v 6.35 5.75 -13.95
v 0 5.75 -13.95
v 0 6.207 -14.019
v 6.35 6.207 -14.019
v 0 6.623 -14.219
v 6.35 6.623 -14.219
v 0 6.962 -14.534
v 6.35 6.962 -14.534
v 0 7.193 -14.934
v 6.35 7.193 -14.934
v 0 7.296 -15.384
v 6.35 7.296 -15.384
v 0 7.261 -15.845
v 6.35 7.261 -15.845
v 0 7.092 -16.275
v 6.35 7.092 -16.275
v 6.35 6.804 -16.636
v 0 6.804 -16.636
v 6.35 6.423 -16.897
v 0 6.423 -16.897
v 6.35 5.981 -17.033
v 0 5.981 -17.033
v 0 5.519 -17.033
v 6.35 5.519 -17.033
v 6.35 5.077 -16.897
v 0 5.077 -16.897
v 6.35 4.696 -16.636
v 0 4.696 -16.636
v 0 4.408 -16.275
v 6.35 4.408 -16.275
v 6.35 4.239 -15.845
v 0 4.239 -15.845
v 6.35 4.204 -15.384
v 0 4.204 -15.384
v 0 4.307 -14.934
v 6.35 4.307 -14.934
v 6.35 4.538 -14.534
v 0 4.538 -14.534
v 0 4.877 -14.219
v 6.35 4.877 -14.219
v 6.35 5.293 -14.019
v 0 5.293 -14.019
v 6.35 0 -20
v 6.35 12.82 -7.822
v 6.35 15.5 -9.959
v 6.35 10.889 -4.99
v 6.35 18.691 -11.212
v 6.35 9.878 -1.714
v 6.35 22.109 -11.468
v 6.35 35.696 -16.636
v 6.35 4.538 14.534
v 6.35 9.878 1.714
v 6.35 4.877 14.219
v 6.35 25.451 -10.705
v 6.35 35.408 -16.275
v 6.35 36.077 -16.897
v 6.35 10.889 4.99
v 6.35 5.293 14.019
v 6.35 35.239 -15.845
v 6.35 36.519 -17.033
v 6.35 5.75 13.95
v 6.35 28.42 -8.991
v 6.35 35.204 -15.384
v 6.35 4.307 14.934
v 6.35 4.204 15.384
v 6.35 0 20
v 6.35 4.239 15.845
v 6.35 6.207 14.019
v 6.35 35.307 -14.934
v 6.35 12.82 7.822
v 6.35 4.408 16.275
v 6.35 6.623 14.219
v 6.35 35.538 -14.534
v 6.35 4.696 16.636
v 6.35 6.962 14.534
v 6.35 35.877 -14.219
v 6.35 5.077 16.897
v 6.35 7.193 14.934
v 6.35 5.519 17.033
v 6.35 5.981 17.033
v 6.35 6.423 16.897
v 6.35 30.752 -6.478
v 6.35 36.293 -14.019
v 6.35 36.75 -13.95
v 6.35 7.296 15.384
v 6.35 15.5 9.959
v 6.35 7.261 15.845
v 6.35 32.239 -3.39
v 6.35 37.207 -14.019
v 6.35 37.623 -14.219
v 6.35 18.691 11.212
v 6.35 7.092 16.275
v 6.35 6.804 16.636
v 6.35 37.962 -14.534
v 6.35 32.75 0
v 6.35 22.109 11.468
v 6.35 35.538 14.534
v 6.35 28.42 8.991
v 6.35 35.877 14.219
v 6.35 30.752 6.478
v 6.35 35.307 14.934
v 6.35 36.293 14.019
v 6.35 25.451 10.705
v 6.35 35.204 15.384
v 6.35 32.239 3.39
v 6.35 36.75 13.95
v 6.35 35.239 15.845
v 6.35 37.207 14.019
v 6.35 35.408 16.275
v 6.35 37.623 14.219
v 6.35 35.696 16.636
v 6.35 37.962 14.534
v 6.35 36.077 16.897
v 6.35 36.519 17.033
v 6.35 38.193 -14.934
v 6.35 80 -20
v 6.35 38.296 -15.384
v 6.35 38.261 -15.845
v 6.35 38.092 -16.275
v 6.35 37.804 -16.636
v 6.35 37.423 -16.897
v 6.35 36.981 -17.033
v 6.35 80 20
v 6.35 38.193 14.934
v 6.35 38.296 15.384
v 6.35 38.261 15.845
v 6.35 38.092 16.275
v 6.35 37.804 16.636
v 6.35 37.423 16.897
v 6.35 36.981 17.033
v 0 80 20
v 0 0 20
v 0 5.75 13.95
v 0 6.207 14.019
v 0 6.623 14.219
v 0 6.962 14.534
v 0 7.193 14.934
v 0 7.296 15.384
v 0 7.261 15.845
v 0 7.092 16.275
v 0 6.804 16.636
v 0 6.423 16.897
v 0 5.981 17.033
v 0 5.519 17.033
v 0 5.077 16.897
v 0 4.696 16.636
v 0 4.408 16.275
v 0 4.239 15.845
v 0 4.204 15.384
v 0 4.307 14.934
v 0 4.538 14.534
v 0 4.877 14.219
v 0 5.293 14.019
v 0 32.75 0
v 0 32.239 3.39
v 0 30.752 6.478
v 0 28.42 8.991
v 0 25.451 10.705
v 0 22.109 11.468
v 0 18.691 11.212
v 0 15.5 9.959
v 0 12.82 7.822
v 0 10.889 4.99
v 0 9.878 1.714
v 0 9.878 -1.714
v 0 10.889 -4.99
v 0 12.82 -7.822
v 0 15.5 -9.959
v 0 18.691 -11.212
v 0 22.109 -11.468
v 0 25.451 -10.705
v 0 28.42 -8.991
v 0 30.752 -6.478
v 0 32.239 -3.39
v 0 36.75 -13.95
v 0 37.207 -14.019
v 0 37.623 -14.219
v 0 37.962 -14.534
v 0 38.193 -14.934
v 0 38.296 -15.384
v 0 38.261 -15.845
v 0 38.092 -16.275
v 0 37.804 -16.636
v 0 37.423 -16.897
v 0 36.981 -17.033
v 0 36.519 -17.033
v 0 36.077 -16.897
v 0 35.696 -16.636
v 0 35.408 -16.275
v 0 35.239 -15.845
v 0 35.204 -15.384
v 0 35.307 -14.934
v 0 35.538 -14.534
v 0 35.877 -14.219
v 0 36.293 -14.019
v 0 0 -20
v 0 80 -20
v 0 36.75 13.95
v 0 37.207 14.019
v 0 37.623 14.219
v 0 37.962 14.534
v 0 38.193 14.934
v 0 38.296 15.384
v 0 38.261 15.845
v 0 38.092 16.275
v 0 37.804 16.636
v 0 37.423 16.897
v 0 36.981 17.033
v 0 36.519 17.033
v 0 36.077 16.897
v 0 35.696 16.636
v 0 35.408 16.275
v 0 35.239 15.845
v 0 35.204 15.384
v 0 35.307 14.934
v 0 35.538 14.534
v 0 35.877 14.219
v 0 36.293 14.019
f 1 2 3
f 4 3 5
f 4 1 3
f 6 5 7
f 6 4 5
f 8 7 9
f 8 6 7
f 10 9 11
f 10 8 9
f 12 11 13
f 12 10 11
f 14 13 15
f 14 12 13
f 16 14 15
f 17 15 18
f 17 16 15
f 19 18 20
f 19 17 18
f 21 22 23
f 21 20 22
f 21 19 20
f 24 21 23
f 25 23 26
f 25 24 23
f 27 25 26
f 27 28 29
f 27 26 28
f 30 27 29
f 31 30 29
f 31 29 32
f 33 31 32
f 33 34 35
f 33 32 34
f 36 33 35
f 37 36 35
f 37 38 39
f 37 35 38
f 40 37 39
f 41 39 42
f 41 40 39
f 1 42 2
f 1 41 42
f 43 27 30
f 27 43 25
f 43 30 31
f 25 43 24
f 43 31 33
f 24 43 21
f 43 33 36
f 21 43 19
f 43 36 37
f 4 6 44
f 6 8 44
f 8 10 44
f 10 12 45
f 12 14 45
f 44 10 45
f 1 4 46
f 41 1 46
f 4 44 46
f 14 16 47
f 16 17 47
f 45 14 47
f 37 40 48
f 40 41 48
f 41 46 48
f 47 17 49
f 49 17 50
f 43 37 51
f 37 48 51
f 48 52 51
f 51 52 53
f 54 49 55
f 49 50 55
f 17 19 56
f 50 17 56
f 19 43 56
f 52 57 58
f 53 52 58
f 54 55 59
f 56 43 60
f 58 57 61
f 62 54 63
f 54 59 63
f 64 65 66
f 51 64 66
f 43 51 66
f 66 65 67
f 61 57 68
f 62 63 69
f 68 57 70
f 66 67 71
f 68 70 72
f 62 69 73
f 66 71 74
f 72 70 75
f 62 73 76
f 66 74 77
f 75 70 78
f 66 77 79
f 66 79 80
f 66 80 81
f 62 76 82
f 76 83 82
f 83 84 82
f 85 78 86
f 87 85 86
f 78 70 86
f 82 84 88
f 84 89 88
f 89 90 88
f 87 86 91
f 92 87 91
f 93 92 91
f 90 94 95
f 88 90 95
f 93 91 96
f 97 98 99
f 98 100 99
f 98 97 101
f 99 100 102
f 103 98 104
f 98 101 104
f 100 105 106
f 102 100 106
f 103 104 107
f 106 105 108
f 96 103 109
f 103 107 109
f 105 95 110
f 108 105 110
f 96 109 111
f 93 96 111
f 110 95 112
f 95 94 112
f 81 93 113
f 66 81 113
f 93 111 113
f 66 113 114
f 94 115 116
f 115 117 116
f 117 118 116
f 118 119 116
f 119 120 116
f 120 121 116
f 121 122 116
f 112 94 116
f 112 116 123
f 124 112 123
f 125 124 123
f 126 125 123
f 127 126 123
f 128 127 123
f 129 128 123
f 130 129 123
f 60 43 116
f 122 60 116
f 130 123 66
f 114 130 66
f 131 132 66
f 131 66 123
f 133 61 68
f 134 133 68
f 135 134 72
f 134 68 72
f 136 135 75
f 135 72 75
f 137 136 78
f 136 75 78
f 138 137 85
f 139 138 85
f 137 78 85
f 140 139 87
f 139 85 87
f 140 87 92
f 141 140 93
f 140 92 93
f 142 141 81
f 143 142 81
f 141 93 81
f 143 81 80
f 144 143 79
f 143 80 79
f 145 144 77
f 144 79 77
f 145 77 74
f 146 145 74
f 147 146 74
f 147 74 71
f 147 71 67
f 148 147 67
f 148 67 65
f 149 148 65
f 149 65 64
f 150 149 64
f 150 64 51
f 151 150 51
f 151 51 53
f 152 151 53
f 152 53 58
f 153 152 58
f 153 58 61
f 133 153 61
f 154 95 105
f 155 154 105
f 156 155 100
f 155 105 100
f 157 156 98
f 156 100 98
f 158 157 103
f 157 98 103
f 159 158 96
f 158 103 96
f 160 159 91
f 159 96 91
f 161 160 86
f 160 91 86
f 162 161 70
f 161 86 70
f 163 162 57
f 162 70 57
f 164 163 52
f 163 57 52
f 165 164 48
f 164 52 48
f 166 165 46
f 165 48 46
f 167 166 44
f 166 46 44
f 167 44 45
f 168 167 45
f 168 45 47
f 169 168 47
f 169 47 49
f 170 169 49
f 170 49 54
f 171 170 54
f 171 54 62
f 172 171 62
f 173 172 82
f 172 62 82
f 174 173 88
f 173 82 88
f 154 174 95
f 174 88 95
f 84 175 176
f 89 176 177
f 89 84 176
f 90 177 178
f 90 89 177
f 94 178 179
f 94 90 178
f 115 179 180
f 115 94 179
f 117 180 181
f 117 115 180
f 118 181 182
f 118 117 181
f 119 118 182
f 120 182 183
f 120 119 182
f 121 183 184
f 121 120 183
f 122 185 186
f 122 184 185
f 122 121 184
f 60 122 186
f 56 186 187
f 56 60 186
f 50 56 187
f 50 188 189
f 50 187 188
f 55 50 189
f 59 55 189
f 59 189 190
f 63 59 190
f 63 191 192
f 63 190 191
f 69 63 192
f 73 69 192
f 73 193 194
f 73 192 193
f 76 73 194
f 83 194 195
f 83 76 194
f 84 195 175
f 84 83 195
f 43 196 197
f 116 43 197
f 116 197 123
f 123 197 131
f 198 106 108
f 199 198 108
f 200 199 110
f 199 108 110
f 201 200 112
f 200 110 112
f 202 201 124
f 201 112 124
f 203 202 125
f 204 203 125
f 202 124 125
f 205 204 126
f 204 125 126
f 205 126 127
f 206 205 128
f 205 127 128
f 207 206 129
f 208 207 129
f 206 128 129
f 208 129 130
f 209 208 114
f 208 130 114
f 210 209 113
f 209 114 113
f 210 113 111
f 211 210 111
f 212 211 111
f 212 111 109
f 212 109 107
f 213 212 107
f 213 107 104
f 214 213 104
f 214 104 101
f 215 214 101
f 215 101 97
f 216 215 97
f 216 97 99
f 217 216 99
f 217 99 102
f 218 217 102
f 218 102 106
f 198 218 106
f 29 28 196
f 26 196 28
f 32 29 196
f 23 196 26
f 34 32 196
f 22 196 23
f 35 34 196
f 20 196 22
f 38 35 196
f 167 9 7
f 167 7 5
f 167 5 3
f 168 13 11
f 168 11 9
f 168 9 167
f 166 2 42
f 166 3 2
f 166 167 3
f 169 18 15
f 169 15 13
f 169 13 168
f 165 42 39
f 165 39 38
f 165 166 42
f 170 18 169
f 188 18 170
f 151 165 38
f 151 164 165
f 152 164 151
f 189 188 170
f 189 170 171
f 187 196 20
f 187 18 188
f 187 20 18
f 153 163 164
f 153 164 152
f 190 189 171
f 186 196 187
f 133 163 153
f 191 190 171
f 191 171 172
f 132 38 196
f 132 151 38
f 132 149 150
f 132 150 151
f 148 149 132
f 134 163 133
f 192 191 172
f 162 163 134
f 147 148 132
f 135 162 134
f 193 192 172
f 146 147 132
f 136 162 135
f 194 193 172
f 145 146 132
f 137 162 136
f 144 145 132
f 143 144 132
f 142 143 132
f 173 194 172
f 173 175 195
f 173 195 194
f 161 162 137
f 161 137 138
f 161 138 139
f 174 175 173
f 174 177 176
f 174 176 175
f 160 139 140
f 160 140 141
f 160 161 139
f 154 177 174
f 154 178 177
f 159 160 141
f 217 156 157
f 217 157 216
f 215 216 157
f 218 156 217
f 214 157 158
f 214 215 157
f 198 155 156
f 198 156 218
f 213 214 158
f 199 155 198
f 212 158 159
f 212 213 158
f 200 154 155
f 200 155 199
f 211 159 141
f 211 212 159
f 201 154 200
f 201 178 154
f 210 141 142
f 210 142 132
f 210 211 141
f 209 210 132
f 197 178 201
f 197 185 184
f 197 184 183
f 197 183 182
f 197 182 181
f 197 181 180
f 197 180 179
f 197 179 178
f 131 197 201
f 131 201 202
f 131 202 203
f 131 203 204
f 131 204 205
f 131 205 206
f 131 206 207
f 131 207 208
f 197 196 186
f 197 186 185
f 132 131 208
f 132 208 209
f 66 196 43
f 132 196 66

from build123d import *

# Parameters (mm, degrees)
SKETCH1_W               = 20
SKETCH1_H               = 80
BOSS_EXTRUDE1_DEPTH     = 6.35
SKETCH2_R               = 1.55
MOTOR_MOUNT_HOLES_DEPTH = 10
SKETCH3_R               = 11.5
FLANGE_HOLE_DEPTH       = 10


with BuildPart() as part:
    # Sketch1 → Boss-Extrude1 (new body)
    with BuildSketch(Plane(origin=(0, 0, 0), x_dir=(0, 0, -1), z_dir=(1, 0, 0))):
        with Locations((-10, 40)):
            Rectangle(SKETCH1_W, SKETCH1_H)
    boss_extrude1 = extrude(amount=BOSS_EXTRUDE1_DEPTH)

    # Sketch2 → Motor Mount Holes (cut)
    with BuildSketch(Plane(origin=(6.35, 0, 0), x_dir=(0, 0, -1), z_dir=(1, 0, 0))):
        with Locations((-15.5, 5.75)):
            Circle(SKETCH2_R)
        with Locations((-15.5, 36.75)):
            Circle(SKETCH2_R)
    motor_mount_holes = extrude(amount=-MOTOR_MOUNT_HOLES_DEPTH, mode=Mode.SUBTRACT)

    # Sketch3 → Flange Hole (cut)
    with BuildSketch(Plane(origin=(6.35, 0, 0), x_dir=(0, 0, -1), z_dir=(1, 0, 0))):
        with Locations((0, 21.25)):
            Circle(SKETCH3_R)
    flange_hole = extrude(amount=-FLANGE_HOLE_DEPTH, mode=Mode.SUBTRACT)

    # Mirror1: Boss-Extrude1, Motor Mount Holes, Flange Hole across plane
    add(boss_extrude1.mirror(Plane(origin=(6.35, 0, 0), x_dir=(1, 0, 0), z_dir=(0, 0, 1))))
    add(motor_mount_holes.mirror(Plane(origin=(6.35, 0, 0), x_dir=(1, 0, 0), z_dir=(0, 0, 1))), mode=Mode.SUBTRACT)
    add(flange_hole.mirror(Plane(origin=(6.35, 0, 0), x_dir=(1, 0, 0), z_dir=(0, 0, 1))), mode=Mode.SUBTRACT)


solid = part.part
